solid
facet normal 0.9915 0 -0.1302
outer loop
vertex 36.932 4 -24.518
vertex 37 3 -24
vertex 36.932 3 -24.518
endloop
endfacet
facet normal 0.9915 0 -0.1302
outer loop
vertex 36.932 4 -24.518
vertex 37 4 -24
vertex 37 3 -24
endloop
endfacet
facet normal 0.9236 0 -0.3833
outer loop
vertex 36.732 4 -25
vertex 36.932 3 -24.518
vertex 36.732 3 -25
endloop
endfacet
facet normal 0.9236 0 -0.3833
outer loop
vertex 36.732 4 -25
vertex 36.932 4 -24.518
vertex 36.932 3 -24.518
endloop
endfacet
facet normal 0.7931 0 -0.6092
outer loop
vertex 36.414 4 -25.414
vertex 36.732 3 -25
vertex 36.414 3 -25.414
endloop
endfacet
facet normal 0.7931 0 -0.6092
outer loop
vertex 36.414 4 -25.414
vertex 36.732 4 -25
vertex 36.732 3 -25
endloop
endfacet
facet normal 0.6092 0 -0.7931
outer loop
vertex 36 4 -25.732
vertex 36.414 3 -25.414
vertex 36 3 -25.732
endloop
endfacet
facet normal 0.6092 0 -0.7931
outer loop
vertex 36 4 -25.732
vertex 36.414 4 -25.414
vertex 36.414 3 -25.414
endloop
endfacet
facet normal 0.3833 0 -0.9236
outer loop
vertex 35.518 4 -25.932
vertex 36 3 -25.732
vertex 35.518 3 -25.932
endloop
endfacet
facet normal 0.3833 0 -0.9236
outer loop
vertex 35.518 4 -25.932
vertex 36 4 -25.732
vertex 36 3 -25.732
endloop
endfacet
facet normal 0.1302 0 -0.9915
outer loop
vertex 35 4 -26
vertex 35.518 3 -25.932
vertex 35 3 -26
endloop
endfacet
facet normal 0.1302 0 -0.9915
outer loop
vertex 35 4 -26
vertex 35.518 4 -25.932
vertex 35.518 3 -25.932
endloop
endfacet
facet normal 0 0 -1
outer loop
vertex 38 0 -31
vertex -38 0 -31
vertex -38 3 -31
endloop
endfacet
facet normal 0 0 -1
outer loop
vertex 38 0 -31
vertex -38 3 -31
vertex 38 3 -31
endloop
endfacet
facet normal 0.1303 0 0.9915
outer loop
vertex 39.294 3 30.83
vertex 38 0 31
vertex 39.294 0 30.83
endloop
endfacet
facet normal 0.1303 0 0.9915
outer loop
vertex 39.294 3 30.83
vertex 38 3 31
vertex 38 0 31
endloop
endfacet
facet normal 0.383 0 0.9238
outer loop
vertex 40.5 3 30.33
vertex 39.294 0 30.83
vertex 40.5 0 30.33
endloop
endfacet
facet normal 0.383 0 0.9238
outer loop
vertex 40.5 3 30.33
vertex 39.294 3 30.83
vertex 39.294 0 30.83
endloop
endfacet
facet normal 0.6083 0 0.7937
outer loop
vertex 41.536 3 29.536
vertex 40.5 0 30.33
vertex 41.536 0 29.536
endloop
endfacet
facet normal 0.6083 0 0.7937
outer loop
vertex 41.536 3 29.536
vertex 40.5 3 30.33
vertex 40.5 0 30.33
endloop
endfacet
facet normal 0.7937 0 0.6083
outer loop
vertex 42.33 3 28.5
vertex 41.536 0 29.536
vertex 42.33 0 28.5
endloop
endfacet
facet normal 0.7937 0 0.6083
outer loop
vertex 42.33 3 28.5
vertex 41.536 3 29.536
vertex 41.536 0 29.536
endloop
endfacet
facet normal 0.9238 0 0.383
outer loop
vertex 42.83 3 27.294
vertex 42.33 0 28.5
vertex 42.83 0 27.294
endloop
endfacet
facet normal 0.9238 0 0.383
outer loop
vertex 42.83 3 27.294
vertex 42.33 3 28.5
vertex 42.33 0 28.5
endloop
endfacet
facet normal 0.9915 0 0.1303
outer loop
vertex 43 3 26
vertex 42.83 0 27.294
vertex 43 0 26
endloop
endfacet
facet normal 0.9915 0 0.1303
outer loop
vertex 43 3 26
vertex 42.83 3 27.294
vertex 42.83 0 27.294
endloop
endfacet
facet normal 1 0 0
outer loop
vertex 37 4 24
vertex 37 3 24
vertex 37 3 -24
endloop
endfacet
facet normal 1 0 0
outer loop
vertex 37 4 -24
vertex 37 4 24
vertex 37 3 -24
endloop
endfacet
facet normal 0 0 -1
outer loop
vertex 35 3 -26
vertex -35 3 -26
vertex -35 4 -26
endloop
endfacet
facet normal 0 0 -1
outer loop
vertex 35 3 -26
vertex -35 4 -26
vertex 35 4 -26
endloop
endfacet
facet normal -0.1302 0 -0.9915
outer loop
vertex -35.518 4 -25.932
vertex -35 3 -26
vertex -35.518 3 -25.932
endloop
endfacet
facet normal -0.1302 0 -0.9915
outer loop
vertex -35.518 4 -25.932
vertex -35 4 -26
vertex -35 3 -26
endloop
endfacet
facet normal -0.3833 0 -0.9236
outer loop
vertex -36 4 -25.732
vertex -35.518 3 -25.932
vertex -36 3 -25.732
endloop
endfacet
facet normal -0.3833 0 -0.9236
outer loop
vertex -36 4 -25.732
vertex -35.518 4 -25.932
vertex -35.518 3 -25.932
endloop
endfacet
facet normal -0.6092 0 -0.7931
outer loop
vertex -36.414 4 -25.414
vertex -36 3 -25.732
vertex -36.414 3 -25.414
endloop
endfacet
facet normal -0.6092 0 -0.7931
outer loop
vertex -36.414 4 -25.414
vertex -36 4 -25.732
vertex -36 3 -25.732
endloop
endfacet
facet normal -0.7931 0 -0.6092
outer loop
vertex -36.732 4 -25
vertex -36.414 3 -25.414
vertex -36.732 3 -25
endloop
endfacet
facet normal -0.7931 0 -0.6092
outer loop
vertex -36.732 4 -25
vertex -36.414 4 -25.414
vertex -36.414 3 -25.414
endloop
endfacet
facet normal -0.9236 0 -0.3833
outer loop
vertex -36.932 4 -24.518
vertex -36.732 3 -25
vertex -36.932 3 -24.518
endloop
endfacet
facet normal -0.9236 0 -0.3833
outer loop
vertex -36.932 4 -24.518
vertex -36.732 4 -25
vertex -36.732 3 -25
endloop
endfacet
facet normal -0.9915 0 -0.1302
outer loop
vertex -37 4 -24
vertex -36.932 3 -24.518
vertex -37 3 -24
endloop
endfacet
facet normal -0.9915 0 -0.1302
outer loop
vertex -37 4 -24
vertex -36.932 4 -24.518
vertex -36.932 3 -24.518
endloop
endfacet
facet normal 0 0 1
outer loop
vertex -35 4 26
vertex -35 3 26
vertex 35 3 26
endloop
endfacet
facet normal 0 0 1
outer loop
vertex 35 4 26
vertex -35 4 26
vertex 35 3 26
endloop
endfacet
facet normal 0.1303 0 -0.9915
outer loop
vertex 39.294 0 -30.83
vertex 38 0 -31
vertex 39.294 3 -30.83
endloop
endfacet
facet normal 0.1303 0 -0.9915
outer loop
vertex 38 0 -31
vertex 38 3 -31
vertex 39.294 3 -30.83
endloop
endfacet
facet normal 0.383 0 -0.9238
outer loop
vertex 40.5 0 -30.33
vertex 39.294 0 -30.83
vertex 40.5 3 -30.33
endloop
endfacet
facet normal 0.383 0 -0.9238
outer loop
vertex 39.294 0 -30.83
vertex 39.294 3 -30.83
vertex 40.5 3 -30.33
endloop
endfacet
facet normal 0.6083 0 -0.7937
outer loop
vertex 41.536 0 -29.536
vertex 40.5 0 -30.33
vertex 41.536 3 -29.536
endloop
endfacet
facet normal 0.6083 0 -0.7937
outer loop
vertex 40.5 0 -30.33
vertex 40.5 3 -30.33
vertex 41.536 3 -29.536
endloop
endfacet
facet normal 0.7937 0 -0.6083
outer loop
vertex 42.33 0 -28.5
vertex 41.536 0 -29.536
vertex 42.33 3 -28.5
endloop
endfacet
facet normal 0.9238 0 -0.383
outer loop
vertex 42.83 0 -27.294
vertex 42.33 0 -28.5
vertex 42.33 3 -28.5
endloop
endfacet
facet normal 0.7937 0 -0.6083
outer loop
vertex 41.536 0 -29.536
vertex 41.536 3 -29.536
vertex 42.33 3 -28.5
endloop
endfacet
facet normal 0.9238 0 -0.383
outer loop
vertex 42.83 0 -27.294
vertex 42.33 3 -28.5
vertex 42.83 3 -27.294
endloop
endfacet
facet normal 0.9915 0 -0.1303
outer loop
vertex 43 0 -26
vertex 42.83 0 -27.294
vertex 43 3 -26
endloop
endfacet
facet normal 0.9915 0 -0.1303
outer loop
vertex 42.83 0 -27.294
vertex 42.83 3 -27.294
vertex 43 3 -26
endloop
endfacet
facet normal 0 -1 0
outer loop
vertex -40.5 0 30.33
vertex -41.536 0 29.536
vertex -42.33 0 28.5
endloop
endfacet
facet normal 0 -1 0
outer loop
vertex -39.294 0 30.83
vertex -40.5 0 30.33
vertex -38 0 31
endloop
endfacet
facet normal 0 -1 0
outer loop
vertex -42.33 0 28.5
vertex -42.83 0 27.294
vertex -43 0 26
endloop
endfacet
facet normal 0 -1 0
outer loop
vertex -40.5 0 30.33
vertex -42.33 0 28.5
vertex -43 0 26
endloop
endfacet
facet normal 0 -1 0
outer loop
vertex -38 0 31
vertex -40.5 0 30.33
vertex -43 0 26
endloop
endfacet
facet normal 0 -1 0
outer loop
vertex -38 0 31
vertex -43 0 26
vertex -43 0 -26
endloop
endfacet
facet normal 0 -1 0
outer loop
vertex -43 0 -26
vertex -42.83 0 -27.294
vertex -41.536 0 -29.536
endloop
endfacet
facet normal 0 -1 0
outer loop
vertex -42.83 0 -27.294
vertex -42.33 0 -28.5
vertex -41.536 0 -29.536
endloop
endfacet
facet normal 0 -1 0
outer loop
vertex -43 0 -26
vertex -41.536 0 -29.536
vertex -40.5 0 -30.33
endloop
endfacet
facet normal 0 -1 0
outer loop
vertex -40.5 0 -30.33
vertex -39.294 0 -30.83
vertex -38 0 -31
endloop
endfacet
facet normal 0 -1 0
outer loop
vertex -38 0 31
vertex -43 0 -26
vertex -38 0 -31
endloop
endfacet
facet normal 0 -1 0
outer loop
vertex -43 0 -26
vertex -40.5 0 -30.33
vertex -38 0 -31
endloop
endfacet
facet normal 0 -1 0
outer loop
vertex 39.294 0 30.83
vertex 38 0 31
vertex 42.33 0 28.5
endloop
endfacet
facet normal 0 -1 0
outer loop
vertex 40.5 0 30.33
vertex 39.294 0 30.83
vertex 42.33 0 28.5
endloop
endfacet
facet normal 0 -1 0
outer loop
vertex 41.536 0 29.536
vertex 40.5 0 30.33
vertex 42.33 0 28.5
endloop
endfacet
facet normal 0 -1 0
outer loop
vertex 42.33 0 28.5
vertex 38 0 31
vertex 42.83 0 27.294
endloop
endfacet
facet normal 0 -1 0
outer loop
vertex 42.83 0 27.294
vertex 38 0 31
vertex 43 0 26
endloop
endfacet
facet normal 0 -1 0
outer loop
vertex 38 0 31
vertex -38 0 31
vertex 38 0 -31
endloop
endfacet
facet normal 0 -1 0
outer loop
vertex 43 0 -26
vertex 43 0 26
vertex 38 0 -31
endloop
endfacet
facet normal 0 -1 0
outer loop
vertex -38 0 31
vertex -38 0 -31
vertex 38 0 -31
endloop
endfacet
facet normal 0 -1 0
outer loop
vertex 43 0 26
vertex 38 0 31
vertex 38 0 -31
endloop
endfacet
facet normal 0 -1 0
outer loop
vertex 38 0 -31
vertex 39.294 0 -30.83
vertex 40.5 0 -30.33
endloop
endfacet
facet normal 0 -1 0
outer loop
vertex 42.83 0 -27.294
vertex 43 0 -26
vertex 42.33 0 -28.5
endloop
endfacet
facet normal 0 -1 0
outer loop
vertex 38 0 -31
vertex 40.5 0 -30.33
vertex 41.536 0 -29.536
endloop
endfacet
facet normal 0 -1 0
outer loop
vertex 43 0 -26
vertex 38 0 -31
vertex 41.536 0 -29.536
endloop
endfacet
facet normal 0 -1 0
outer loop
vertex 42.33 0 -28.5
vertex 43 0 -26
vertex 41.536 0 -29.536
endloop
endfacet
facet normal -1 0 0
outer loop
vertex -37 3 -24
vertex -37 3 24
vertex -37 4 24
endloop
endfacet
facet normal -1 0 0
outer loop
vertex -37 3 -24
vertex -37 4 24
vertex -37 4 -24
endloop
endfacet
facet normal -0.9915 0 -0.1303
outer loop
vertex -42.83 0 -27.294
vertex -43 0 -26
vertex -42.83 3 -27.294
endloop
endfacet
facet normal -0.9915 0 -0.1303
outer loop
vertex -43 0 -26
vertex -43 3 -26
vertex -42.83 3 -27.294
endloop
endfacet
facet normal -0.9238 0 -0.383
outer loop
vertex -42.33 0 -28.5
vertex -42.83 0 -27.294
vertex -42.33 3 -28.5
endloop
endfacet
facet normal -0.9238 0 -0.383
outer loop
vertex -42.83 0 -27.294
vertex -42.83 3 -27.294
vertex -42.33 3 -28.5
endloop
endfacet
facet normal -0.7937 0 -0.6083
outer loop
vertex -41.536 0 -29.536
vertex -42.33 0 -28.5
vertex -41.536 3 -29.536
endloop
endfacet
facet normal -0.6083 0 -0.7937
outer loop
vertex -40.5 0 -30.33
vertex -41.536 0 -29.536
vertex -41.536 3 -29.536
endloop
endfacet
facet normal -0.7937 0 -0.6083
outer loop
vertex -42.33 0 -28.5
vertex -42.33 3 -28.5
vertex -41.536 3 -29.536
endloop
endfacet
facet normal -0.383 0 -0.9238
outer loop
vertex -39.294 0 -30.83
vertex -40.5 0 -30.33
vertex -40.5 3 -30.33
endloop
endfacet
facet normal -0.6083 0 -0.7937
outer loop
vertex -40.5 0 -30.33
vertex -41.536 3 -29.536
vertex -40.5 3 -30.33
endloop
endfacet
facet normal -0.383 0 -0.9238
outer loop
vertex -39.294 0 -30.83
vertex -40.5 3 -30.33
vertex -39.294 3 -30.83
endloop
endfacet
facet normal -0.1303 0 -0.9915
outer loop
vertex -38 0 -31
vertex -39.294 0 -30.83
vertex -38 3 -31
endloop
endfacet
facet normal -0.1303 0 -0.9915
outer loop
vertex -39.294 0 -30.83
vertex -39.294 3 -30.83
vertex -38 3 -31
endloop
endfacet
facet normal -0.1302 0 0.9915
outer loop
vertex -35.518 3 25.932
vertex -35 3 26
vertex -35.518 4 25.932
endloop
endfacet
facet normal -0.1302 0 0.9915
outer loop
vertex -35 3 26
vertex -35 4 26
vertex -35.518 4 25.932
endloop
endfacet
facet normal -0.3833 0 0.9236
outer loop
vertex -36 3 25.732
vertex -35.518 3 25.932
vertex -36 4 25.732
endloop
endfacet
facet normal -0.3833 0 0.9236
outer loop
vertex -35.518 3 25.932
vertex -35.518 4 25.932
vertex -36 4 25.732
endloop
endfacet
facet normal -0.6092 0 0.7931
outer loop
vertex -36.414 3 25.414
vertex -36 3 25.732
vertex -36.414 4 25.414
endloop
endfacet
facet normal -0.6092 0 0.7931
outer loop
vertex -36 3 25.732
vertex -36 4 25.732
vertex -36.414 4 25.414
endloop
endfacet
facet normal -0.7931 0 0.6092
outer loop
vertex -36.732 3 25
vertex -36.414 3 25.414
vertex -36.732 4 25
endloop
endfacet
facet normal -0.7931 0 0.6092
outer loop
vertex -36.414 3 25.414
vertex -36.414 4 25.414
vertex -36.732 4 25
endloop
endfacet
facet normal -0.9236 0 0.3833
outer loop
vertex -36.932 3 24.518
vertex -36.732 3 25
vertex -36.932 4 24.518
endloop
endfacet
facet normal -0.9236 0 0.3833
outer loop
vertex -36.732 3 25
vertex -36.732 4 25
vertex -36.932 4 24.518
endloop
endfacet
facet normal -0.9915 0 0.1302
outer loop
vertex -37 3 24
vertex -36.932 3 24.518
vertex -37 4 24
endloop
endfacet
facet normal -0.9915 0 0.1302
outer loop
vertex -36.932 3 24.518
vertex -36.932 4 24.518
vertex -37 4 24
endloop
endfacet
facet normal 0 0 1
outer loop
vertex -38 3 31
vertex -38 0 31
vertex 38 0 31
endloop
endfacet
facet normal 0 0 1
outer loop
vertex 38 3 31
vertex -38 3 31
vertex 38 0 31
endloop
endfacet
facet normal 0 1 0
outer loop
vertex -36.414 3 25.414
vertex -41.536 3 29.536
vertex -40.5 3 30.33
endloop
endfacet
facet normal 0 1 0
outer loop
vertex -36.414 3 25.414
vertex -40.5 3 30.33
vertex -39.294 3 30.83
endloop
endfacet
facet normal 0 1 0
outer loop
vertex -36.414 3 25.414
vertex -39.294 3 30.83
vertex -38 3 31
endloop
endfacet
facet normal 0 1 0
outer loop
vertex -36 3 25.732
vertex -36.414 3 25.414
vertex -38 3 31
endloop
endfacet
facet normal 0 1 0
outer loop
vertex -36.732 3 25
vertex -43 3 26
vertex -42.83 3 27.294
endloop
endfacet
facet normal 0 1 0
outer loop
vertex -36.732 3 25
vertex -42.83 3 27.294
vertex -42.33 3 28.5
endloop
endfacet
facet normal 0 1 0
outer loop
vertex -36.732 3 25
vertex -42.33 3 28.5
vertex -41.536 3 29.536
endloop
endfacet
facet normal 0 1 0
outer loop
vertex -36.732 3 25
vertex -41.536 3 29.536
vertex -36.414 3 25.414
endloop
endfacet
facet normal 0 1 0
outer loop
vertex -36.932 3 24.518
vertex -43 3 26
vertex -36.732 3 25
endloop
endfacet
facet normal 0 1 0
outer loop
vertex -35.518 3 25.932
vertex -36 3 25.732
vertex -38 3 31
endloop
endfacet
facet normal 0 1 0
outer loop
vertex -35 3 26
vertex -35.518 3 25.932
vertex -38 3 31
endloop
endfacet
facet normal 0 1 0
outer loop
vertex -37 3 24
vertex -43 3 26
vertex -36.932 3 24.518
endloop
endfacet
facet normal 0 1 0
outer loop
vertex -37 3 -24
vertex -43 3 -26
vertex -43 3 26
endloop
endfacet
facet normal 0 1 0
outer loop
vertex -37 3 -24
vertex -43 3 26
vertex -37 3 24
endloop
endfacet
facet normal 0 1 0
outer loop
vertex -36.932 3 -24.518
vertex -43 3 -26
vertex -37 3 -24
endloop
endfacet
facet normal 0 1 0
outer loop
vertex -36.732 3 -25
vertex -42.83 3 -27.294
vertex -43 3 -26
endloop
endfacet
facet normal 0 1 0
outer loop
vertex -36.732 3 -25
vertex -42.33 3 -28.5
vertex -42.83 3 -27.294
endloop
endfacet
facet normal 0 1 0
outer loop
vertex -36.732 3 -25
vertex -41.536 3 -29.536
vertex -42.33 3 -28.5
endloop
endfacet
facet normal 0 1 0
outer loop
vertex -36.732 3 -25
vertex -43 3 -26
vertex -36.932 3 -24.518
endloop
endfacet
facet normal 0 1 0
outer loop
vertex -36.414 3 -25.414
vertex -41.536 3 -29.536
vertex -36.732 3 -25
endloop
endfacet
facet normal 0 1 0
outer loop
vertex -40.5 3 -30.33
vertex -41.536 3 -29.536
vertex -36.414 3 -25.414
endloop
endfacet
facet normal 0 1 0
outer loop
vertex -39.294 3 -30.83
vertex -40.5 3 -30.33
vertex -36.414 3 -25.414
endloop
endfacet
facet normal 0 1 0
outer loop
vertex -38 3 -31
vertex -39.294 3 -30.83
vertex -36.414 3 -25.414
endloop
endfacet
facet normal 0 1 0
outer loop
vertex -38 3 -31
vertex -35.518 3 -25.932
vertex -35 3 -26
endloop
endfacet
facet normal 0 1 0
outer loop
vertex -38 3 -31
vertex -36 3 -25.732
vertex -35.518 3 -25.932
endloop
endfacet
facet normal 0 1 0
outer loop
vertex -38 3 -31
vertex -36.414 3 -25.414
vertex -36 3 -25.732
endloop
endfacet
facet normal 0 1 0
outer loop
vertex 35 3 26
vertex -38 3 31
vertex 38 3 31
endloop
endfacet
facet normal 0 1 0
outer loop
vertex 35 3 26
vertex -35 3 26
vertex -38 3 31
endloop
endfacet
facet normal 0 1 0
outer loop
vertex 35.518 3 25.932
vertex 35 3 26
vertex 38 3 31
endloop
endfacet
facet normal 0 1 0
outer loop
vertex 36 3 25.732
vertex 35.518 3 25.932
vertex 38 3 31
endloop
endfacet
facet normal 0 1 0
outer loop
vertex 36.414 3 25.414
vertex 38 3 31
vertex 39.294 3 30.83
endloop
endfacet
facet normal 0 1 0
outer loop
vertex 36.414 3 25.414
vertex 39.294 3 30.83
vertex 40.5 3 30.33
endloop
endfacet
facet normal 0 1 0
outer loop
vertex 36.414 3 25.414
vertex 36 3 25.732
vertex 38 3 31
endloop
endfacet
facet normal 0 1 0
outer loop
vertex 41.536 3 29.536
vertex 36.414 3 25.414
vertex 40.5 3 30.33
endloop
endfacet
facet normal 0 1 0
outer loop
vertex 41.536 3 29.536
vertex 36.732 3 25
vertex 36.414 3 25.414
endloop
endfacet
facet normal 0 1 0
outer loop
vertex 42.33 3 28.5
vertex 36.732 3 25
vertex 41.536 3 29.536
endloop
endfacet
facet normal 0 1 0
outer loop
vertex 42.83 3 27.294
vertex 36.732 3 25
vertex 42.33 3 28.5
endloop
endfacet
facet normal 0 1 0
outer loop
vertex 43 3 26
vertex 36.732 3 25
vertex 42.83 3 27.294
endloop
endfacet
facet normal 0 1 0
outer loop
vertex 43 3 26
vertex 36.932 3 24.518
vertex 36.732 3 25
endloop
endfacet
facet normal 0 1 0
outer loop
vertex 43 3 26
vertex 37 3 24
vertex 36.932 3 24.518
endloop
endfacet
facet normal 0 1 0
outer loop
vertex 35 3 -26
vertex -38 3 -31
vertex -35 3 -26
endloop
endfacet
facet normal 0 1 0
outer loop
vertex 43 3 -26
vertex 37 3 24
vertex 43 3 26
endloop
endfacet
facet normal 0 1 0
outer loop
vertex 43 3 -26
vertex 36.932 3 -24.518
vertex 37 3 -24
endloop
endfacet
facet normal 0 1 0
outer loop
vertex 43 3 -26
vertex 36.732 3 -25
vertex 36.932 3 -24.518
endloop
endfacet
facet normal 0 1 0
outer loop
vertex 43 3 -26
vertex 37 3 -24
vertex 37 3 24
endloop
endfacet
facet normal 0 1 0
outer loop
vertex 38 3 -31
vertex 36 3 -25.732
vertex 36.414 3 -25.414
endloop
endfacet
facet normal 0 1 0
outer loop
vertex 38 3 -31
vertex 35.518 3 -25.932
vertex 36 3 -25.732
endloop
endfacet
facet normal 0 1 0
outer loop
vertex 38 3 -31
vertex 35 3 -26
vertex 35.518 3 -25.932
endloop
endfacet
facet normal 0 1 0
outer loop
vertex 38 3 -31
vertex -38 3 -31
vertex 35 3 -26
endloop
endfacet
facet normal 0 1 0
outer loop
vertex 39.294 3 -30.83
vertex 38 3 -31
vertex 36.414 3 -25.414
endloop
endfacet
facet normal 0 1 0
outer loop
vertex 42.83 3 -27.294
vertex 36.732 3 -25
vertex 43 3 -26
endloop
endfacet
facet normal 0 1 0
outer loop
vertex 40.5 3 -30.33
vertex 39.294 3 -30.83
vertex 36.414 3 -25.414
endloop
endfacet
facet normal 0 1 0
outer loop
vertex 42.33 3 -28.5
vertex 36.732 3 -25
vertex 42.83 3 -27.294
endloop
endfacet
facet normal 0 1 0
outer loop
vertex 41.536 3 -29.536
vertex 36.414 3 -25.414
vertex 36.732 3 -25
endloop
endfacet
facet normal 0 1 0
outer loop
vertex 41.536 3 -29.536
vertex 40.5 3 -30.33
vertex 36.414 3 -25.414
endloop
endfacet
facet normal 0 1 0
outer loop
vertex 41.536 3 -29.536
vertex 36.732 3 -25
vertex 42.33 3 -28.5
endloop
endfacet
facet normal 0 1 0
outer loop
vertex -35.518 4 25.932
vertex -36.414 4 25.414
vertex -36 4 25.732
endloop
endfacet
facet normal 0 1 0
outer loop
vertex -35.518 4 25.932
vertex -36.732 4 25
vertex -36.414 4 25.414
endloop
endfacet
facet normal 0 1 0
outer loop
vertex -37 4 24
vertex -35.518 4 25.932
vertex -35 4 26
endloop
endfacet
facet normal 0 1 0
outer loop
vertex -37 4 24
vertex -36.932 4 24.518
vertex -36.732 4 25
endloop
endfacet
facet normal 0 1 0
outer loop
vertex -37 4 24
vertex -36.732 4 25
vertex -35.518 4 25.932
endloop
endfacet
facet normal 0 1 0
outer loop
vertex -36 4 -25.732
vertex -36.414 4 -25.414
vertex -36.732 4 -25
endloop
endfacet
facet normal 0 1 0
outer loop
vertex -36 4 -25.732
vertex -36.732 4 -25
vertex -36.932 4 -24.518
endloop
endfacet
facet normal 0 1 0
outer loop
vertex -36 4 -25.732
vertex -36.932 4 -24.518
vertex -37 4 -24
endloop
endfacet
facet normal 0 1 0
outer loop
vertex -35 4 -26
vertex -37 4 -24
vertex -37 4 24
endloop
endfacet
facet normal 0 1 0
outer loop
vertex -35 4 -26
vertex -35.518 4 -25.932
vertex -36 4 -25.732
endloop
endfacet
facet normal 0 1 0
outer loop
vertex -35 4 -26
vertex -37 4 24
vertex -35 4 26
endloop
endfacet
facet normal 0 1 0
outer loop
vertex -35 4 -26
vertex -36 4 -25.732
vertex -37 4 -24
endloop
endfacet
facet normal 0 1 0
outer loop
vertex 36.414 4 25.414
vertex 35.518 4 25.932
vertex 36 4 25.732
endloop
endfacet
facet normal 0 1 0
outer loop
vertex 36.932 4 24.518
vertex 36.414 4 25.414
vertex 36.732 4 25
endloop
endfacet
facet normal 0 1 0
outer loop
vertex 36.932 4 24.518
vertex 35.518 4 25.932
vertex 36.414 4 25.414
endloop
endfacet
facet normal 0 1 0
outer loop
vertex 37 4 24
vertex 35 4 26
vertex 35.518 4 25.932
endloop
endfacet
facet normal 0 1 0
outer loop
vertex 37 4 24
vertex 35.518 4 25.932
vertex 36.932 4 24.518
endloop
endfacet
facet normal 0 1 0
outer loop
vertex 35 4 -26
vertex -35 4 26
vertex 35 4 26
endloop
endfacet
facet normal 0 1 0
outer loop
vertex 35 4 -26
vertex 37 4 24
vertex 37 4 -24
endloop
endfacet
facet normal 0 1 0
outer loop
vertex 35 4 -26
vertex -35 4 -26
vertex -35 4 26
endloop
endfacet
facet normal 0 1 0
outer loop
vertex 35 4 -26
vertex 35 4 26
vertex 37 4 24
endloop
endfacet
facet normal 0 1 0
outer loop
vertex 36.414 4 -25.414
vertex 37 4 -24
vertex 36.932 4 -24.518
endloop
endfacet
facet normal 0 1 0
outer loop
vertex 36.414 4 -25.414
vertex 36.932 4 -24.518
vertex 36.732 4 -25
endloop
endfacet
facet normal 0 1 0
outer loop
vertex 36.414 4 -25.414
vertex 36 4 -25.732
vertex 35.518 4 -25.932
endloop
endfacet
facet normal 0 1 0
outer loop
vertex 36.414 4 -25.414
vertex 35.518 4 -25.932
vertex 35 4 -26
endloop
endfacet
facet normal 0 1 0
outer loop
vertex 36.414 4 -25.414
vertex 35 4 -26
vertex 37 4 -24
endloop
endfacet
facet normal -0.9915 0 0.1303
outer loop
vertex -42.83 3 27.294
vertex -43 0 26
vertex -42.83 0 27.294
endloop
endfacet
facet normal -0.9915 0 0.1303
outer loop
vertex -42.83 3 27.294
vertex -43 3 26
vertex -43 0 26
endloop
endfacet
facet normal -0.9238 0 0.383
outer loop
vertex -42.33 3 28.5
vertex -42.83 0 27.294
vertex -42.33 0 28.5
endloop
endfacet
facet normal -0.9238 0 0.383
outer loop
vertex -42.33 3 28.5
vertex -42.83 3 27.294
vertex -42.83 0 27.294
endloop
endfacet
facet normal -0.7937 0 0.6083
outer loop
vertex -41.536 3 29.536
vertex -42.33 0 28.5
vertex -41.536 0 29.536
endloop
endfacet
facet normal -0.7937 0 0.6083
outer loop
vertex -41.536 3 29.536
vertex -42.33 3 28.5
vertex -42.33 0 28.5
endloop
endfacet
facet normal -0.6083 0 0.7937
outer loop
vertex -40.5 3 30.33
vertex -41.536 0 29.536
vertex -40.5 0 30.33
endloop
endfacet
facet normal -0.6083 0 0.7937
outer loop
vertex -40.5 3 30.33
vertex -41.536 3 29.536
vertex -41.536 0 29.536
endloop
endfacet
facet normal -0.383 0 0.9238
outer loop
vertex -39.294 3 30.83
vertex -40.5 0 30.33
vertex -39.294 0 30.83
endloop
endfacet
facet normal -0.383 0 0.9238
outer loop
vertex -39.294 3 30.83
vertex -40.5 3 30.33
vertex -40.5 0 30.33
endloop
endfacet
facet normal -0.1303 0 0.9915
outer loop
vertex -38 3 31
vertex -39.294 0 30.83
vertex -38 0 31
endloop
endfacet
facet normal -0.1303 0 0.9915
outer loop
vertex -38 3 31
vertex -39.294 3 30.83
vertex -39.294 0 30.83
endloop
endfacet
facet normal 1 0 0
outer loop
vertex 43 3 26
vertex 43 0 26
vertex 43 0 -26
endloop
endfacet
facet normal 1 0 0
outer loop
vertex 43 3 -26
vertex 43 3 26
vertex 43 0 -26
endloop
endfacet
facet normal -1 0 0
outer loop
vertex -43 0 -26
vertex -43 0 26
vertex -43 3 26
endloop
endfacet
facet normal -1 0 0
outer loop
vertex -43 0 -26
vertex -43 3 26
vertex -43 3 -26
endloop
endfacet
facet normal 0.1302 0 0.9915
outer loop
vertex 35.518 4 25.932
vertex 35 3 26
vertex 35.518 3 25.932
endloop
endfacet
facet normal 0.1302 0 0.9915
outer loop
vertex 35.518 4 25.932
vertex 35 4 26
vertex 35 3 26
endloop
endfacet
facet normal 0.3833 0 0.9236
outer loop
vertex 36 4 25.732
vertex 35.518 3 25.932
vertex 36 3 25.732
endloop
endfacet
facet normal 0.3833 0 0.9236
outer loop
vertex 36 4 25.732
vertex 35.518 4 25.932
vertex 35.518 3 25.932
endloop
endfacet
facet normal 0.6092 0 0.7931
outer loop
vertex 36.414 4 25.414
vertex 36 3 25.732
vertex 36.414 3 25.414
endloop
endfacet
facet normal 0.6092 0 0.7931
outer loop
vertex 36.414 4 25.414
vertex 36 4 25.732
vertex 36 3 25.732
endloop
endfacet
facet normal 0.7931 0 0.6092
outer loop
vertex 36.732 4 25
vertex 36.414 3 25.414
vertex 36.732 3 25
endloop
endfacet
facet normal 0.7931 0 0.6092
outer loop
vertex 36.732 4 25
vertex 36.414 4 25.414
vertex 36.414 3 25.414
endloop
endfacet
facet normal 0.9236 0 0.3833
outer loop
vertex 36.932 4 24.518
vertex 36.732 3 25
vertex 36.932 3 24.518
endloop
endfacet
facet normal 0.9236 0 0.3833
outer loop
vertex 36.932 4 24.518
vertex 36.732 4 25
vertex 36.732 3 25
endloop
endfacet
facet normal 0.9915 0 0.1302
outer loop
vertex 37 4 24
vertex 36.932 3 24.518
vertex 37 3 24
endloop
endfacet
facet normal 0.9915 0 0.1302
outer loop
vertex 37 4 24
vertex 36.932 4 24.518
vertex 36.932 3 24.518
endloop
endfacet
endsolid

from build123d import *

# Parameters (mm, degrees)
SKETCH_1_W      = 86
SKETCH_1_H      = 62
EXTRUDE_1_DEPTH = 3
SKETCH_2_W      = 74
SKETCH_2_H      = 52
EXTRUDE_2_DEPTH = 1
FILLET_1_R      = 5
FILLET_2_R      = 2


with BuildPart() as part:
    # 草图1 → 凸台-拉伸1 (new body)
    with BuildSketch(Plane(origin=(0, 0, 0), x_dir=(1, 0, 0), z_dir=(0, 1, 0))):
        Rectangle(SKETCH_1_W, SKETCH_1_H)
    extrude(amount=EXTRUDE_1_DEPTH)

    # 草图2 → 凸台-拉伸2 (add)
    with BuildSketch(Plane(origin=(0, 3, 0), x_dir=(1, 0, 0), z_dir=(0, 1, 0))):
        Rectangle(SKETCH_2_W, SKETCH_2_H)
    extrude(amount=EXTRUDE_2_DEPTH)

    # 圆角1
    fillet_1_edges = [part.edges().sort_by_distance(p)[0] for p in [
        (-43, 1.5, -31),
        (43, 1.5, -31),
        (43, 1.5, 31),
        (-43, 1.5, 31),
    ]]
    fillet(fillet_1_edges, radius=FILLET_1_R)

    # 圆角2
    fillet_2_edges = [part.edges().sort_by_distance(p)[0] for p in [
        (-37, 3.5, -26),
        (-37, 3.5, 26),
        (37, 3.5, 26),
        (37, 3.5, -26),
    ]]
    fillet(fillet_2_edges, radius=FILLET_2_R)


solid = part.part
